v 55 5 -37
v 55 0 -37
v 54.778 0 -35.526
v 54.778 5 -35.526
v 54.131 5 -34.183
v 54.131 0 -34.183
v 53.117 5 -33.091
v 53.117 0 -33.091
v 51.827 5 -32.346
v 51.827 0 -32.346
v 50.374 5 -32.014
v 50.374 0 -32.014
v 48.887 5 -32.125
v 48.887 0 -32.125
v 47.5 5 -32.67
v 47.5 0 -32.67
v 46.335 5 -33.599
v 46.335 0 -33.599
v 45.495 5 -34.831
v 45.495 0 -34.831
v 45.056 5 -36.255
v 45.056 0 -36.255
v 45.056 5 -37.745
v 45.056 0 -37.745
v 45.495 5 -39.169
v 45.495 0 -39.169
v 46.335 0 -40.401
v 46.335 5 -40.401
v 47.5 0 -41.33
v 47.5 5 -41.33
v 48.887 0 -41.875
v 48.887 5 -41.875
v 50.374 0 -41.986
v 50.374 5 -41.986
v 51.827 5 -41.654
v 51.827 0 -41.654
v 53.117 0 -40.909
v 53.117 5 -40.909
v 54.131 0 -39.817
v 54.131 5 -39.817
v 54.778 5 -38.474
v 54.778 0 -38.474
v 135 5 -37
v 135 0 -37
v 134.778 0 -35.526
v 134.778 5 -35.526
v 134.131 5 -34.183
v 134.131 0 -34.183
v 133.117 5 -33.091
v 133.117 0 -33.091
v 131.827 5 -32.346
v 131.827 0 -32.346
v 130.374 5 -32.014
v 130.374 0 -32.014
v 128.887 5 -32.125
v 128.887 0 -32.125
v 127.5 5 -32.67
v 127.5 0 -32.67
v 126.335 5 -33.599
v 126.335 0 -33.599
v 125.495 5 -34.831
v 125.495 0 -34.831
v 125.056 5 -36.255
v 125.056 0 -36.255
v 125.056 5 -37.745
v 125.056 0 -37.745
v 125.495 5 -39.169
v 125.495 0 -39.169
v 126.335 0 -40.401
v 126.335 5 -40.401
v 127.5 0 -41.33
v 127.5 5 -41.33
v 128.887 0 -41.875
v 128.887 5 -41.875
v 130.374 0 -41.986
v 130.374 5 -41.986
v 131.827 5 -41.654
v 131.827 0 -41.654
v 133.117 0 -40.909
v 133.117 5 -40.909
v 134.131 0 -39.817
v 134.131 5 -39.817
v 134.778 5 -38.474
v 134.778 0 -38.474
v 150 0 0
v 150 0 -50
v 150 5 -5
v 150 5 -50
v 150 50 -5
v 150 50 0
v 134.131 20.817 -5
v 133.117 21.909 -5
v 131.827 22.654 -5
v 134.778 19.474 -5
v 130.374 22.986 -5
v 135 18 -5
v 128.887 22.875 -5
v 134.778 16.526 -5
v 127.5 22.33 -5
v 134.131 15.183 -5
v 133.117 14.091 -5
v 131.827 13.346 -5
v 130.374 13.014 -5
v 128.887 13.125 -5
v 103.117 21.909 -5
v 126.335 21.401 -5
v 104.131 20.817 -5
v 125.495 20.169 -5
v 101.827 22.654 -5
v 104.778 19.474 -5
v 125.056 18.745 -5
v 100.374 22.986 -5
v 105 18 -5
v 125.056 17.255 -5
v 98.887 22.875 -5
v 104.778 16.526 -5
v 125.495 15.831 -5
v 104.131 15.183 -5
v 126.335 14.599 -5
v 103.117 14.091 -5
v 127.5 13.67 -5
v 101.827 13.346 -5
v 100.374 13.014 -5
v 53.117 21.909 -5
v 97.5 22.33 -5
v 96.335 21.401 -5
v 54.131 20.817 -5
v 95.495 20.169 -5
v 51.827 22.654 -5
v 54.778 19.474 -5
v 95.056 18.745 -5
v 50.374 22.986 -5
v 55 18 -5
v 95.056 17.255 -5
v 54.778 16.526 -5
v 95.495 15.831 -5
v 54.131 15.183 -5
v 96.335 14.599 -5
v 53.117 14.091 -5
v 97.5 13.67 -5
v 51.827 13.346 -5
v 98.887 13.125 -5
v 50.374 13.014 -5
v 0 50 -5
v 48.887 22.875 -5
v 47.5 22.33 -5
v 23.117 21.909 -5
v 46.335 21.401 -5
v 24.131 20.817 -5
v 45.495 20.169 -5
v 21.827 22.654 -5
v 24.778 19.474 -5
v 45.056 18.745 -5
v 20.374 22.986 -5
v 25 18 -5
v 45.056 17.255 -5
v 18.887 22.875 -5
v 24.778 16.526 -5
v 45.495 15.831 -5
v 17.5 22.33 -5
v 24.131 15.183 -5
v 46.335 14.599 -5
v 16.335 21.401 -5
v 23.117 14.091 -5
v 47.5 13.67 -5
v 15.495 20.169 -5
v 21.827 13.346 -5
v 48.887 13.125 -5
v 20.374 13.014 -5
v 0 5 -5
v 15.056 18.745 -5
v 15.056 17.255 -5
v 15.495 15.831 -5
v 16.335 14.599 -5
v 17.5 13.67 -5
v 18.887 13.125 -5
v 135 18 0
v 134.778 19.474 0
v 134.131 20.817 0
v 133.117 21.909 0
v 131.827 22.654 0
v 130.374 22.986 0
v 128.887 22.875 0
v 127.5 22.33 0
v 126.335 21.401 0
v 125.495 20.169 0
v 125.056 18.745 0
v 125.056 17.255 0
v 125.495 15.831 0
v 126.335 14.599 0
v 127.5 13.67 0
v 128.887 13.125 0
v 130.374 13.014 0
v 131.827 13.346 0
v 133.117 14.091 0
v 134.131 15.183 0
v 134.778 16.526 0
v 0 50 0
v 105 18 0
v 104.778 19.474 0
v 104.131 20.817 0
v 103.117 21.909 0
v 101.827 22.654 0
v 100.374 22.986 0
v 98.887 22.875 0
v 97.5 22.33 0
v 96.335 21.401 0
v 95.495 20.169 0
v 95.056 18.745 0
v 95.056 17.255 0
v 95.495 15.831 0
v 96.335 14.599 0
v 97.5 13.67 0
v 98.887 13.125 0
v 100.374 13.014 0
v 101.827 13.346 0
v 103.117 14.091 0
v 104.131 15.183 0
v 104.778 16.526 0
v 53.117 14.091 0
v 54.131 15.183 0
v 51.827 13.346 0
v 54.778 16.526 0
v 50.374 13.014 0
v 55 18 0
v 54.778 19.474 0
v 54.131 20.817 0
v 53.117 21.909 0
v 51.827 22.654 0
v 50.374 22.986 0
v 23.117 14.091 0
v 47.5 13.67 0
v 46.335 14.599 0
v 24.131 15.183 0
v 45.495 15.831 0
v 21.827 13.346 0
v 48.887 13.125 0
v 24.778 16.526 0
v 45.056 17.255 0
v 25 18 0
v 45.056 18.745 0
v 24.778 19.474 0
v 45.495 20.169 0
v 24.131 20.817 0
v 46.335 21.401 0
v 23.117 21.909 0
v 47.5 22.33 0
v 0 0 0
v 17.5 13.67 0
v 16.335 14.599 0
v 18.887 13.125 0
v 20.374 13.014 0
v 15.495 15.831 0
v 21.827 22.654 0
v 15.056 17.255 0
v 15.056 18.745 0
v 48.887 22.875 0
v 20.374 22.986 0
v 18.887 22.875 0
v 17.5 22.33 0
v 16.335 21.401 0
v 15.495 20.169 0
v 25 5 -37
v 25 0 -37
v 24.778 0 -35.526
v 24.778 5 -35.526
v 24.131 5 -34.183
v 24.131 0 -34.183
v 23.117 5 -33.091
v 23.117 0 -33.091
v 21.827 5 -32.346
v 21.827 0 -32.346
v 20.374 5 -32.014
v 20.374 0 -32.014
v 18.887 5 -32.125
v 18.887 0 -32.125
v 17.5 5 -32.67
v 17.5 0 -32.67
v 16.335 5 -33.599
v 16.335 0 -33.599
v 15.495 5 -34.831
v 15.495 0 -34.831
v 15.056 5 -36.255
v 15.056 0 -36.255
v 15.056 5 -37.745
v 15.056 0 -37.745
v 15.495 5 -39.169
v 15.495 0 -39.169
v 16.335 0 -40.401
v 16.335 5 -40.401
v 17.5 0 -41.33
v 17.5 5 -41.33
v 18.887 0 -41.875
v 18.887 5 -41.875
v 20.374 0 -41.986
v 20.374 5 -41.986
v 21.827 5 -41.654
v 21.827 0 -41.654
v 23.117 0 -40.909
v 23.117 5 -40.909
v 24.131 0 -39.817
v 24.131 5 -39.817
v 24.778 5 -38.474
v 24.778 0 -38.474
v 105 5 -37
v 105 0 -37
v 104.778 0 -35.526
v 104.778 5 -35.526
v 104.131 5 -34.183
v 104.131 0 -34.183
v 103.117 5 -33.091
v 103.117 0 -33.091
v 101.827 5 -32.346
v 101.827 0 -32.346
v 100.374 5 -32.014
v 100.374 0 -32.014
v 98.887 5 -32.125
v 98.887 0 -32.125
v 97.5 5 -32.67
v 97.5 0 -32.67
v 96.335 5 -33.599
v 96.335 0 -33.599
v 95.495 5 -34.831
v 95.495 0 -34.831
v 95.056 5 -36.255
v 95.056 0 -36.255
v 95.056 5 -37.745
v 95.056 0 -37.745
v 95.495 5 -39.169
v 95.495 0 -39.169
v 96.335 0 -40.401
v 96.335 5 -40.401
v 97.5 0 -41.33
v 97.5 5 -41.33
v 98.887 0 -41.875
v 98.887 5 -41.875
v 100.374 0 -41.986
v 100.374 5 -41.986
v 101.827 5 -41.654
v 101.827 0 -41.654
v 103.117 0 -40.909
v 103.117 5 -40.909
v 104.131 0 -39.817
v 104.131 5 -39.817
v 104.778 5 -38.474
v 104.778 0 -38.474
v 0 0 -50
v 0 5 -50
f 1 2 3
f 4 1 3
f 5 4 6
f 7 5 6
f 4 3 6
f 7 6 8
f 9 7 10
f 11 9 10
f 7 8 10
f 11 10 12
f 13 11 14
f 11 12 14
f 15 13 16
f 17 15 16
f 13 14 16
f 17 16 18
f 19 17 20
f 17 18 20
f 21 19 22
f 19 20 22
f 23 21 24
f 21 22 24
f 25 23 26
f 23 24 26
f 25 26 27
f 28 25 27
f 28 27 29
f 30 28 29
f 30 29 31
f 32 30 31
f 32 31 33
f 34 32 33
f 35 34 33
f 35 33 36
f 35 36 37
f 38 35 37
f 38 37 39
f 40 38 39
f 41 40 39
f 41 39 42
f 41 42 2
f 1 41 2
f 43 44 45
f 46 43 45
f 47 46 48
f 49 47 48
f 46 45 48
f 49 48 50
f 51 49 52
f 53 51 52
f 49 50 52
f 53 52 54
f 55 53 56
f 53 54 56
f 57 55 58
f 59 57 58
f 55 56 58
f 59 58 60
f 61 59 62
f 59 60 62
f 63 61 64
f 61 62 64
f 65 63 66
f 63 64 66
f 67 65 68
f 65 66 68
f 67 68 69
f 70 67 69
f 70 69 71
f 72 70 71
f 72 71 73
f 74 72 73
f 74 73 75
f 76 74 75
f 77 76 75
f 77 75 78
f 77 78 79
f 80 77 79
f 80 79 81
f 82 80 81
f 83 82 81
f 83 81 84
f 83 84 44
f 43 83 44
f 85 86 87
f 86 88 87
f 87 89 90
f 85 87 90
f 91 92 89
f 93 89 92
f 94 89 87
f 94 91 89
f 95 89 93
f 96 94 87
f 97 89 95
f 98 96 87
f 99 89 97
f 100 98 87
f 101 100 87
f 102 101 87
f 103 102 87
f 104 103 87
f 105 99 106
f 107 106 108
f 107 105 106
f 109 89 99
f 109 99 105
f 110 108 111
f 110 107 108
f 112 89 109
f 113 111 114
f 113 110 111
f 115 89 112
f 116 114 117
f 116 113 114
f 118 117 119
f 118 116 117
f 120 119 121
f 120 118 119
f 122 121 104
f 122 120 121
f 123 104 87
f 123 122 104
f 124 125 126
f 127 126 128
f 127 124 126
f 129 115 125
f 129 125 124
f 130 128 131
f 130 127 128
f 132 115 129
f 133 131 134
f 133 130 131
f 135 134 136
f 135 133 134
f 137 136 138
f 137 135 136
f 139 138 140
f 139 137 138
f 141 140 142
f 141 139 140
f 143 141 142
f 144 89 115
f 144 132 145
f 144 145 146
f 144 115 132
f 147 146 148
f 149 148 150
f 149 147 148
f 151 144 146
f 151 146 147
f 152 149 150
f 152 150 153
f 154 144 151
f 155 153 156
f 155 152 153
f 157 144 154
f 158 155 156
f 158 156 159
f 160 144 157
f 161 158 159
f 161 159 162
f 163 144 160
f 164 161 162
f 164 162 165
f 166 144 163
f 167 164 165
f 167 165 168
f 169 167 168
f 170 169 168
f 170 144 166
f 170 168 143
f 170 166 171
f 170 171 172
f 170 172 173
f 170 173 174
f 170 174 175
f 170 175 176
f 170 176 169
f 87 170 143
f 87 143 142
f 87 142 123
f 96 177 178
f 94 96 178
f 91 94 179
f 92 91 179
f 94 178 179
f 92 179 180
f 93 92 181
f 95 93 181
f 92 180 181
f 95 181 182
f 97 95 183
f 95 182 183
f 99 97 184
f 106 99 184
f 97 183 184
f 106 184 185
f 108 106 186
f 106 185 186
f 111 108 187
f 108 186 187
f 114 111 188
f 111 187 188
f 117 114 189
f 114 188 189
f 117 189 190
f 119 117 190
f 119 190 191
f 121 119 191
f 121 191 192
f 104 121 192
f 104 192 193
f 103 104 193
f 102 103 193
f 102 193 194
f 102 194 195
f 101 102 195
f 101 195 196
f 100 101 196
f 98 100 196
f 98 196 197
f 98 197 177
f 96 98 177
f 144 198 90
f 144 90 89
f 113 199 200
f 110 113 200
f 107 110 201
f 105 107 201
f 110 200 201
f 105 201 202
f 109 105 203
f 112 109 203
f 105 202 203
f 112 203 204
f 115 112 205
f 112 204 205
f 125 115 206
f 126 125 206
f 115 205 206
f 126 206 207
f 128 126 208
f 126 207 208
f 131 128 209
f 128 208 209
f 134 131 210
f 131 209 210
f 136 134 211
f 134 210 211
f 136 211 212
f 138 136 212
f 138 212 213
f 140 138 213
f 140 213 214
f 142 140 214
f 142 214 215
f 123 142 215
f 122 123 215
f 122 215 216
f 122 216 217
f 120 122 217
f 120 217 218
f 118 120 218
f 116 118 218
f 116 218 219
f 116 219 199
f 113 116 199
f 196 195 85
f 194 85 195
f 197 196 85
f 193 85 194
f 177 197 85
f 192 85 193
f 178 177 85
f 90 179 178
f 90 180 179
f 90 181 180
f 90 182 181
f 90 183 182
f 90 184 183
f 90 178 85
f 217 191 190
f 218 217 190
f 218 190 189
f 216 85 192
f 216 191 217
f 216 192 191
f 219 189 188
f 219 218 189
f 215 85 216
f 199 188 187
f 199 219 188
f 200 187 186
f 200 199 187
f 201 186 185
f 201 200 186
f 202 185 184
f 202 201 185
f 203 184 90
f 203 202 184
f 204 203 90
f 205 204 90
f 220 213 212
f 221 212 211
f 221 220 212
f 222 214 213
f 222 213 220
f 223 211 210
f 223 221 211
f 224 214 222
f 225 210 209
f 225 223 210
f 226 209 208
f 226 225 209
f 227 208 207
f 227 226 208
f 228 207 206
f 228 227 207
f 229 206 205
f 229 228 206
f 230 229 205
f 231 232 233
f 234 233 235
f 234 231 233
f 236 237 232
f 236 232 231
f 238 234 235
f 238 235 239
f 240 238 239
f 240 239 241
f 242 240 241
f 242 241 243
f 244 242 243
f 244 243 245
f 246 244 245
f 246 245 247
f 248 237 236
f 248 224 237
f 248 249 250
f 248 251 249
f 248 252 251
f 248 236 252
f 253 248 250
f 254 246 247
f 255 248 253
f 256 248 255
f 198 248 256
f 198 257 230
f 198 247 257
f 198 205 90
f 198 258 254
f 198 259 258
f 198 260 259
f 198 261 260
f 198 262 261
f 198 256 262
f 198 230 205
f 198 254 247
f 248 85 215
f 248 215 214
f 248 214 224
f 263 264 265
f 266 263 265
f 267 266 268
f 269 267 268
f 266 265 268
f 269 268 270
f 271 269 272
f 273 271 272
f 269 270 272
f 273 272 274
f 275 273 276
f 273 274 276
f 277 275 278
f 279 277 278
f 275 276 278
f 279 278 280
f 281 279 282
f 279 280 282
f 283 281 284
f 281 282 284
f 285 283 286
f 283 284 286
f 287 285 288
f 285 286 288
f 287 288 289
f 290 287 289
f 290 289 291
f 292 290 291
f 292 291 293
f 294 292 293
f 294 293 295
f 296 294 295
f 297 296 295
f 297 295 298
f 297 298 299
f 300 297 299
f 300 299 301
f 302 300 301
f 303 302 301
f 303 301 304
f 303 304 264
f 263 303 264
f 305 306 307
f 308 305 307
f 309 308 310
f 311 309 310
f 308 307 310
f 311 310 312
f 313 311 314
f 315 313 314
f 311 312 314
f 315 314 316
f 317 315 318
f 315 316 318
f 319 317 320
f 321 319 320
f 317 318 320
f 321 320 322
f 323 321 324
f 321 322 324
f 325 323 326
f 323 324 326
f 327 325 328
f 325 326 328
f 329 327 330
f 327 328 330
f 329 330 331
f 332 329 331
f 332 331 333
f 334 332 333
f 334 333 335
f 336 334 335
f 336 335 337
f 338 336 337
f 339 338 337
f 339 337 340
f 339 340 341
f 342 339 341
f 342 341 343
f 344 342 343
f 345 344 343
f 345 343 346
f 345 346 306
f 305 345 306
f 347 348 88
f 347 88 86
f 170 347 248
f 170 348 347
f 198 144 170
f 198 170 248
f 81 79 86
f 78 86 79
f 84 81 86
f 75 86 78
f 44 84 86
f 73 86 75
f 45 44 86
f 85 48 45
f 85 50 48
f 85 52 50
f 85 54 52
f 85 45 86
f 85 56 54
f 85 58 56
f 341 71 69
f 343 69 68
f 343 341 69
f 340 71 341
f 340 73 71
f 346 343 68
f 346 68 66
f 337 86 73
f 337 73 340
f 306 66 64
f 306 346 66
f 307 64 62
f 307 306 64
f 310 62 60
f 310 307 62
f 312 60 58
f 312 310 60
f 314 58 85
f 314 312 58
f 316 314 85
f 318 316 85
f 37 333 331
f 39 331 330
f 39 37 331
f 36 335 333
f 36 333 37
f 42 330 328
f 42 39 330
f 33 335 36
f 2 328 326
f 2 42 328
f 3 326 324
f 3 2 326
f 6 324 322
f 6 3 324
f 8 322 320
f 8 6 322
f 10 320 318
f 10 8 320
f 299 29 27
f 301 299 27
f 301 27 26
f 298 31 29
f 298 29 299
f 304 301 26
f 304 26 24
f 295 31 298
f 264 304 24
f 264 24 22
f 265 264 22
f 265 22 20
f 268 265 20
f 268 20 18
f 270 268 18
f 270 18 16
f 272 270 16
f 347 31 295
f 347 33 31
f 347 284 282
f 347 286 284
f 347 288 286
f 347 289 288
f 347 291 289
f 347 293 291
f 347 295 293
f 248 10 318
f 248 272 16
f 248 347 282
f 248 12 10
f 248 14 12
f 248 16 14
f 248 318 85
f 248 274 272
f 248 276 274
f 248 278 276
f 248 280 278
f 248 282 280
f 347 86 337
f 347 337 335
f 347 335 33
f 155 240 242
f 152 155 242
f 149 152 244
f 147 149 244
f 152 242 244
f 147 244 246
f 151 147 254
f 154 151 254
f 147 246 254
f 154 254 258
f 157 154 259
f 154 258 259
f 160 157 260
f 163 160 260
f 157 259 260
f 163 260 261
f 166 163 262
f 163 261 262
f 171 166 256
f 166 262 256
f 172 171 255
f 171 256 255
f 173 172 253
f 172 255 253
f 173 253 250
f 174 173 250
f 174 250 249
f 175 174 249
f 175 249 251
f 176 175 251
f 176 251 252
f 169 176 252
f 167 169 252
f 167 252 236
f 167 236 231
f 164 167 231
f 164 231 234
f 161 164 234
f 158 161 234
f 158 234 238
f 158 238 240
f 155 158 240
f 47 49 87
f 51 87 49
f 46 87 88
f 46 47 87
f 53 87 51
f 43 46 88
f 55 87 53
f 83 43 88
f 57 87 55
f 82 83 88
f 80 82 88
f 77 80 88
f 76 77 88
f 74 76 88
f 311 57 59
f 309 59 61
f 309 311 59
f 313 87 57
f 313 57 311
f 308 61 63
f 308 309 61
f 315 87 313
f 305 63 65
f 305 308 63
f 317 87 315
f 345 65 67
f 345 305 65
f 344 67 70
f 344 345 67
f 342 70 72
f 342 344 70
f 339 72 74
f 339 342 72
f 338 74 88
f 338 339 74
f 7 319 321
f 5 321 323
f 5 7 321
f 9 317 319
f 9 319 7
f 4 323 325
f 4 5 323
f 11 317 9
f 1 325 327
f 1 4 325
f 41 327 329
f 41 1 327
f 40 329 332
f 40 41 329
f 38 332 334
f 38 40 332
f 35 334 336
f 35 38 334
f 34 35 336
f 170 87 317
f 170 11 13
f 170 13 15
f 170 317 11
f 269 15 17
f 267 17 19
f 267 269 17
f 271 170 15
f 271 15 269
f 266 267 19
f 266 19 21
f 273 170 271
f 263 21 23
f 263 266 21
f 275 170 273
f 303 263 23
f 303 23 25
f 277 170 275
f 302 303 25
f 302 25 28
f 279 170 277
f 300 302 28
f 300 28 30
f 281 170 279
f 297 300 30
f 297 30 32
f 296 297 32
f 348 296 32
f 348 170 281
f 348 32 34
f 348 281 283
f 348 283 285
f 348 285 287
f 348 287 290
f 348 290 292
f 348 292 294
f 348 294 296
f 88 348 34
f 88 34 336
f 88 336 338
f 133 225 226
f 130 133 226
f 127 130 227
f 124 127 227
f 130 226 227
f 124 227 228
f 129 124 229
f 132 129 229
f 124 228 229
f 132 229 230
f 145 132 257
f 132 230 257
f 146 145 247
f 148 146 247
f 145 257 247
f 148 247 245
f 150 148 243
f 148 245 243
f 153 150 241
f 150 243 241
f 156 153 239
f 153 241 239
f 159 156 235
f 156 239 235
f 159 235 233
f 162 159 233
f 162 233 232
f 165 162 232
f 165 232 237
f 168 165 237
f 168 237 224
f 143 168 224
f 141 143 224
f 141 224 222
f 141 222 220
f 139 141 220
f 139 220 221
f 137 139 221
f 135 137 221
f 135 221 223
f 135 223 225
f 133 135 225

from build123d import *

# Parameters (mm, degrees)
EXTRUDE_1_DEPTH     = 150
SKETCH_2_R          = 5
CUT_EXTRUDE_1_DEPTH = 51
SKETCH_3_R          = 5
CUT_EXTRUDE_3_DEPTH = 51


with BuildPart() as part:
    # Эскиз1 → Вытянуть-Тонкостенный1 (new body)
    with BuildSketch(Plane(origin=(0, 0, 0), x_dir=(0, 0, -1), z_dir=(1, 0, 0))):
        Polygon((50, 0), (0, 0), (0, 50), (5, 50), (5, 5), (50, 5), align=None)
    extrude(amount=EXTRUDE_1_DEPTH)

    # Эскиз2 → Вырез-Вытянуть1 (cut, through all)
    with BuildSketch(Plane.XZ):
        with Locations((130, -37)):
            Circle(SKETCH_2_R)
        with Locations((100, -37)):
            Circle(SKETCH_2_R)
        with Locations((50, -37)):
            Circle(SKETCH_2_R)
        with Locations((20, -37)):
            Circle(SKETCH_2_R)
    extrude(amount=-CUT_EXTRUDE_1_DEPTH, mode=Mode.SUBTRACT)

    # Эскиз3 → Вырез-Вытянуть3 (cut, through all)
    with BuildSketch(Plane.XY):
        with Locations((130, 18)):
            Circle(SKETCH_3_R)
        with Locations((100, 18)):
            Circle(SKETCH_3_R)
        with Locations((50, 18)):
            Circle(SKETCH_3_R)
        with Locations((20, 18)):
            Circle(SKETCH_3_R)
    extrude(amount=-CUT_EXTRUDE_3_DEPTH, mode=Mode.SUBTRACT)


solid = part.part
